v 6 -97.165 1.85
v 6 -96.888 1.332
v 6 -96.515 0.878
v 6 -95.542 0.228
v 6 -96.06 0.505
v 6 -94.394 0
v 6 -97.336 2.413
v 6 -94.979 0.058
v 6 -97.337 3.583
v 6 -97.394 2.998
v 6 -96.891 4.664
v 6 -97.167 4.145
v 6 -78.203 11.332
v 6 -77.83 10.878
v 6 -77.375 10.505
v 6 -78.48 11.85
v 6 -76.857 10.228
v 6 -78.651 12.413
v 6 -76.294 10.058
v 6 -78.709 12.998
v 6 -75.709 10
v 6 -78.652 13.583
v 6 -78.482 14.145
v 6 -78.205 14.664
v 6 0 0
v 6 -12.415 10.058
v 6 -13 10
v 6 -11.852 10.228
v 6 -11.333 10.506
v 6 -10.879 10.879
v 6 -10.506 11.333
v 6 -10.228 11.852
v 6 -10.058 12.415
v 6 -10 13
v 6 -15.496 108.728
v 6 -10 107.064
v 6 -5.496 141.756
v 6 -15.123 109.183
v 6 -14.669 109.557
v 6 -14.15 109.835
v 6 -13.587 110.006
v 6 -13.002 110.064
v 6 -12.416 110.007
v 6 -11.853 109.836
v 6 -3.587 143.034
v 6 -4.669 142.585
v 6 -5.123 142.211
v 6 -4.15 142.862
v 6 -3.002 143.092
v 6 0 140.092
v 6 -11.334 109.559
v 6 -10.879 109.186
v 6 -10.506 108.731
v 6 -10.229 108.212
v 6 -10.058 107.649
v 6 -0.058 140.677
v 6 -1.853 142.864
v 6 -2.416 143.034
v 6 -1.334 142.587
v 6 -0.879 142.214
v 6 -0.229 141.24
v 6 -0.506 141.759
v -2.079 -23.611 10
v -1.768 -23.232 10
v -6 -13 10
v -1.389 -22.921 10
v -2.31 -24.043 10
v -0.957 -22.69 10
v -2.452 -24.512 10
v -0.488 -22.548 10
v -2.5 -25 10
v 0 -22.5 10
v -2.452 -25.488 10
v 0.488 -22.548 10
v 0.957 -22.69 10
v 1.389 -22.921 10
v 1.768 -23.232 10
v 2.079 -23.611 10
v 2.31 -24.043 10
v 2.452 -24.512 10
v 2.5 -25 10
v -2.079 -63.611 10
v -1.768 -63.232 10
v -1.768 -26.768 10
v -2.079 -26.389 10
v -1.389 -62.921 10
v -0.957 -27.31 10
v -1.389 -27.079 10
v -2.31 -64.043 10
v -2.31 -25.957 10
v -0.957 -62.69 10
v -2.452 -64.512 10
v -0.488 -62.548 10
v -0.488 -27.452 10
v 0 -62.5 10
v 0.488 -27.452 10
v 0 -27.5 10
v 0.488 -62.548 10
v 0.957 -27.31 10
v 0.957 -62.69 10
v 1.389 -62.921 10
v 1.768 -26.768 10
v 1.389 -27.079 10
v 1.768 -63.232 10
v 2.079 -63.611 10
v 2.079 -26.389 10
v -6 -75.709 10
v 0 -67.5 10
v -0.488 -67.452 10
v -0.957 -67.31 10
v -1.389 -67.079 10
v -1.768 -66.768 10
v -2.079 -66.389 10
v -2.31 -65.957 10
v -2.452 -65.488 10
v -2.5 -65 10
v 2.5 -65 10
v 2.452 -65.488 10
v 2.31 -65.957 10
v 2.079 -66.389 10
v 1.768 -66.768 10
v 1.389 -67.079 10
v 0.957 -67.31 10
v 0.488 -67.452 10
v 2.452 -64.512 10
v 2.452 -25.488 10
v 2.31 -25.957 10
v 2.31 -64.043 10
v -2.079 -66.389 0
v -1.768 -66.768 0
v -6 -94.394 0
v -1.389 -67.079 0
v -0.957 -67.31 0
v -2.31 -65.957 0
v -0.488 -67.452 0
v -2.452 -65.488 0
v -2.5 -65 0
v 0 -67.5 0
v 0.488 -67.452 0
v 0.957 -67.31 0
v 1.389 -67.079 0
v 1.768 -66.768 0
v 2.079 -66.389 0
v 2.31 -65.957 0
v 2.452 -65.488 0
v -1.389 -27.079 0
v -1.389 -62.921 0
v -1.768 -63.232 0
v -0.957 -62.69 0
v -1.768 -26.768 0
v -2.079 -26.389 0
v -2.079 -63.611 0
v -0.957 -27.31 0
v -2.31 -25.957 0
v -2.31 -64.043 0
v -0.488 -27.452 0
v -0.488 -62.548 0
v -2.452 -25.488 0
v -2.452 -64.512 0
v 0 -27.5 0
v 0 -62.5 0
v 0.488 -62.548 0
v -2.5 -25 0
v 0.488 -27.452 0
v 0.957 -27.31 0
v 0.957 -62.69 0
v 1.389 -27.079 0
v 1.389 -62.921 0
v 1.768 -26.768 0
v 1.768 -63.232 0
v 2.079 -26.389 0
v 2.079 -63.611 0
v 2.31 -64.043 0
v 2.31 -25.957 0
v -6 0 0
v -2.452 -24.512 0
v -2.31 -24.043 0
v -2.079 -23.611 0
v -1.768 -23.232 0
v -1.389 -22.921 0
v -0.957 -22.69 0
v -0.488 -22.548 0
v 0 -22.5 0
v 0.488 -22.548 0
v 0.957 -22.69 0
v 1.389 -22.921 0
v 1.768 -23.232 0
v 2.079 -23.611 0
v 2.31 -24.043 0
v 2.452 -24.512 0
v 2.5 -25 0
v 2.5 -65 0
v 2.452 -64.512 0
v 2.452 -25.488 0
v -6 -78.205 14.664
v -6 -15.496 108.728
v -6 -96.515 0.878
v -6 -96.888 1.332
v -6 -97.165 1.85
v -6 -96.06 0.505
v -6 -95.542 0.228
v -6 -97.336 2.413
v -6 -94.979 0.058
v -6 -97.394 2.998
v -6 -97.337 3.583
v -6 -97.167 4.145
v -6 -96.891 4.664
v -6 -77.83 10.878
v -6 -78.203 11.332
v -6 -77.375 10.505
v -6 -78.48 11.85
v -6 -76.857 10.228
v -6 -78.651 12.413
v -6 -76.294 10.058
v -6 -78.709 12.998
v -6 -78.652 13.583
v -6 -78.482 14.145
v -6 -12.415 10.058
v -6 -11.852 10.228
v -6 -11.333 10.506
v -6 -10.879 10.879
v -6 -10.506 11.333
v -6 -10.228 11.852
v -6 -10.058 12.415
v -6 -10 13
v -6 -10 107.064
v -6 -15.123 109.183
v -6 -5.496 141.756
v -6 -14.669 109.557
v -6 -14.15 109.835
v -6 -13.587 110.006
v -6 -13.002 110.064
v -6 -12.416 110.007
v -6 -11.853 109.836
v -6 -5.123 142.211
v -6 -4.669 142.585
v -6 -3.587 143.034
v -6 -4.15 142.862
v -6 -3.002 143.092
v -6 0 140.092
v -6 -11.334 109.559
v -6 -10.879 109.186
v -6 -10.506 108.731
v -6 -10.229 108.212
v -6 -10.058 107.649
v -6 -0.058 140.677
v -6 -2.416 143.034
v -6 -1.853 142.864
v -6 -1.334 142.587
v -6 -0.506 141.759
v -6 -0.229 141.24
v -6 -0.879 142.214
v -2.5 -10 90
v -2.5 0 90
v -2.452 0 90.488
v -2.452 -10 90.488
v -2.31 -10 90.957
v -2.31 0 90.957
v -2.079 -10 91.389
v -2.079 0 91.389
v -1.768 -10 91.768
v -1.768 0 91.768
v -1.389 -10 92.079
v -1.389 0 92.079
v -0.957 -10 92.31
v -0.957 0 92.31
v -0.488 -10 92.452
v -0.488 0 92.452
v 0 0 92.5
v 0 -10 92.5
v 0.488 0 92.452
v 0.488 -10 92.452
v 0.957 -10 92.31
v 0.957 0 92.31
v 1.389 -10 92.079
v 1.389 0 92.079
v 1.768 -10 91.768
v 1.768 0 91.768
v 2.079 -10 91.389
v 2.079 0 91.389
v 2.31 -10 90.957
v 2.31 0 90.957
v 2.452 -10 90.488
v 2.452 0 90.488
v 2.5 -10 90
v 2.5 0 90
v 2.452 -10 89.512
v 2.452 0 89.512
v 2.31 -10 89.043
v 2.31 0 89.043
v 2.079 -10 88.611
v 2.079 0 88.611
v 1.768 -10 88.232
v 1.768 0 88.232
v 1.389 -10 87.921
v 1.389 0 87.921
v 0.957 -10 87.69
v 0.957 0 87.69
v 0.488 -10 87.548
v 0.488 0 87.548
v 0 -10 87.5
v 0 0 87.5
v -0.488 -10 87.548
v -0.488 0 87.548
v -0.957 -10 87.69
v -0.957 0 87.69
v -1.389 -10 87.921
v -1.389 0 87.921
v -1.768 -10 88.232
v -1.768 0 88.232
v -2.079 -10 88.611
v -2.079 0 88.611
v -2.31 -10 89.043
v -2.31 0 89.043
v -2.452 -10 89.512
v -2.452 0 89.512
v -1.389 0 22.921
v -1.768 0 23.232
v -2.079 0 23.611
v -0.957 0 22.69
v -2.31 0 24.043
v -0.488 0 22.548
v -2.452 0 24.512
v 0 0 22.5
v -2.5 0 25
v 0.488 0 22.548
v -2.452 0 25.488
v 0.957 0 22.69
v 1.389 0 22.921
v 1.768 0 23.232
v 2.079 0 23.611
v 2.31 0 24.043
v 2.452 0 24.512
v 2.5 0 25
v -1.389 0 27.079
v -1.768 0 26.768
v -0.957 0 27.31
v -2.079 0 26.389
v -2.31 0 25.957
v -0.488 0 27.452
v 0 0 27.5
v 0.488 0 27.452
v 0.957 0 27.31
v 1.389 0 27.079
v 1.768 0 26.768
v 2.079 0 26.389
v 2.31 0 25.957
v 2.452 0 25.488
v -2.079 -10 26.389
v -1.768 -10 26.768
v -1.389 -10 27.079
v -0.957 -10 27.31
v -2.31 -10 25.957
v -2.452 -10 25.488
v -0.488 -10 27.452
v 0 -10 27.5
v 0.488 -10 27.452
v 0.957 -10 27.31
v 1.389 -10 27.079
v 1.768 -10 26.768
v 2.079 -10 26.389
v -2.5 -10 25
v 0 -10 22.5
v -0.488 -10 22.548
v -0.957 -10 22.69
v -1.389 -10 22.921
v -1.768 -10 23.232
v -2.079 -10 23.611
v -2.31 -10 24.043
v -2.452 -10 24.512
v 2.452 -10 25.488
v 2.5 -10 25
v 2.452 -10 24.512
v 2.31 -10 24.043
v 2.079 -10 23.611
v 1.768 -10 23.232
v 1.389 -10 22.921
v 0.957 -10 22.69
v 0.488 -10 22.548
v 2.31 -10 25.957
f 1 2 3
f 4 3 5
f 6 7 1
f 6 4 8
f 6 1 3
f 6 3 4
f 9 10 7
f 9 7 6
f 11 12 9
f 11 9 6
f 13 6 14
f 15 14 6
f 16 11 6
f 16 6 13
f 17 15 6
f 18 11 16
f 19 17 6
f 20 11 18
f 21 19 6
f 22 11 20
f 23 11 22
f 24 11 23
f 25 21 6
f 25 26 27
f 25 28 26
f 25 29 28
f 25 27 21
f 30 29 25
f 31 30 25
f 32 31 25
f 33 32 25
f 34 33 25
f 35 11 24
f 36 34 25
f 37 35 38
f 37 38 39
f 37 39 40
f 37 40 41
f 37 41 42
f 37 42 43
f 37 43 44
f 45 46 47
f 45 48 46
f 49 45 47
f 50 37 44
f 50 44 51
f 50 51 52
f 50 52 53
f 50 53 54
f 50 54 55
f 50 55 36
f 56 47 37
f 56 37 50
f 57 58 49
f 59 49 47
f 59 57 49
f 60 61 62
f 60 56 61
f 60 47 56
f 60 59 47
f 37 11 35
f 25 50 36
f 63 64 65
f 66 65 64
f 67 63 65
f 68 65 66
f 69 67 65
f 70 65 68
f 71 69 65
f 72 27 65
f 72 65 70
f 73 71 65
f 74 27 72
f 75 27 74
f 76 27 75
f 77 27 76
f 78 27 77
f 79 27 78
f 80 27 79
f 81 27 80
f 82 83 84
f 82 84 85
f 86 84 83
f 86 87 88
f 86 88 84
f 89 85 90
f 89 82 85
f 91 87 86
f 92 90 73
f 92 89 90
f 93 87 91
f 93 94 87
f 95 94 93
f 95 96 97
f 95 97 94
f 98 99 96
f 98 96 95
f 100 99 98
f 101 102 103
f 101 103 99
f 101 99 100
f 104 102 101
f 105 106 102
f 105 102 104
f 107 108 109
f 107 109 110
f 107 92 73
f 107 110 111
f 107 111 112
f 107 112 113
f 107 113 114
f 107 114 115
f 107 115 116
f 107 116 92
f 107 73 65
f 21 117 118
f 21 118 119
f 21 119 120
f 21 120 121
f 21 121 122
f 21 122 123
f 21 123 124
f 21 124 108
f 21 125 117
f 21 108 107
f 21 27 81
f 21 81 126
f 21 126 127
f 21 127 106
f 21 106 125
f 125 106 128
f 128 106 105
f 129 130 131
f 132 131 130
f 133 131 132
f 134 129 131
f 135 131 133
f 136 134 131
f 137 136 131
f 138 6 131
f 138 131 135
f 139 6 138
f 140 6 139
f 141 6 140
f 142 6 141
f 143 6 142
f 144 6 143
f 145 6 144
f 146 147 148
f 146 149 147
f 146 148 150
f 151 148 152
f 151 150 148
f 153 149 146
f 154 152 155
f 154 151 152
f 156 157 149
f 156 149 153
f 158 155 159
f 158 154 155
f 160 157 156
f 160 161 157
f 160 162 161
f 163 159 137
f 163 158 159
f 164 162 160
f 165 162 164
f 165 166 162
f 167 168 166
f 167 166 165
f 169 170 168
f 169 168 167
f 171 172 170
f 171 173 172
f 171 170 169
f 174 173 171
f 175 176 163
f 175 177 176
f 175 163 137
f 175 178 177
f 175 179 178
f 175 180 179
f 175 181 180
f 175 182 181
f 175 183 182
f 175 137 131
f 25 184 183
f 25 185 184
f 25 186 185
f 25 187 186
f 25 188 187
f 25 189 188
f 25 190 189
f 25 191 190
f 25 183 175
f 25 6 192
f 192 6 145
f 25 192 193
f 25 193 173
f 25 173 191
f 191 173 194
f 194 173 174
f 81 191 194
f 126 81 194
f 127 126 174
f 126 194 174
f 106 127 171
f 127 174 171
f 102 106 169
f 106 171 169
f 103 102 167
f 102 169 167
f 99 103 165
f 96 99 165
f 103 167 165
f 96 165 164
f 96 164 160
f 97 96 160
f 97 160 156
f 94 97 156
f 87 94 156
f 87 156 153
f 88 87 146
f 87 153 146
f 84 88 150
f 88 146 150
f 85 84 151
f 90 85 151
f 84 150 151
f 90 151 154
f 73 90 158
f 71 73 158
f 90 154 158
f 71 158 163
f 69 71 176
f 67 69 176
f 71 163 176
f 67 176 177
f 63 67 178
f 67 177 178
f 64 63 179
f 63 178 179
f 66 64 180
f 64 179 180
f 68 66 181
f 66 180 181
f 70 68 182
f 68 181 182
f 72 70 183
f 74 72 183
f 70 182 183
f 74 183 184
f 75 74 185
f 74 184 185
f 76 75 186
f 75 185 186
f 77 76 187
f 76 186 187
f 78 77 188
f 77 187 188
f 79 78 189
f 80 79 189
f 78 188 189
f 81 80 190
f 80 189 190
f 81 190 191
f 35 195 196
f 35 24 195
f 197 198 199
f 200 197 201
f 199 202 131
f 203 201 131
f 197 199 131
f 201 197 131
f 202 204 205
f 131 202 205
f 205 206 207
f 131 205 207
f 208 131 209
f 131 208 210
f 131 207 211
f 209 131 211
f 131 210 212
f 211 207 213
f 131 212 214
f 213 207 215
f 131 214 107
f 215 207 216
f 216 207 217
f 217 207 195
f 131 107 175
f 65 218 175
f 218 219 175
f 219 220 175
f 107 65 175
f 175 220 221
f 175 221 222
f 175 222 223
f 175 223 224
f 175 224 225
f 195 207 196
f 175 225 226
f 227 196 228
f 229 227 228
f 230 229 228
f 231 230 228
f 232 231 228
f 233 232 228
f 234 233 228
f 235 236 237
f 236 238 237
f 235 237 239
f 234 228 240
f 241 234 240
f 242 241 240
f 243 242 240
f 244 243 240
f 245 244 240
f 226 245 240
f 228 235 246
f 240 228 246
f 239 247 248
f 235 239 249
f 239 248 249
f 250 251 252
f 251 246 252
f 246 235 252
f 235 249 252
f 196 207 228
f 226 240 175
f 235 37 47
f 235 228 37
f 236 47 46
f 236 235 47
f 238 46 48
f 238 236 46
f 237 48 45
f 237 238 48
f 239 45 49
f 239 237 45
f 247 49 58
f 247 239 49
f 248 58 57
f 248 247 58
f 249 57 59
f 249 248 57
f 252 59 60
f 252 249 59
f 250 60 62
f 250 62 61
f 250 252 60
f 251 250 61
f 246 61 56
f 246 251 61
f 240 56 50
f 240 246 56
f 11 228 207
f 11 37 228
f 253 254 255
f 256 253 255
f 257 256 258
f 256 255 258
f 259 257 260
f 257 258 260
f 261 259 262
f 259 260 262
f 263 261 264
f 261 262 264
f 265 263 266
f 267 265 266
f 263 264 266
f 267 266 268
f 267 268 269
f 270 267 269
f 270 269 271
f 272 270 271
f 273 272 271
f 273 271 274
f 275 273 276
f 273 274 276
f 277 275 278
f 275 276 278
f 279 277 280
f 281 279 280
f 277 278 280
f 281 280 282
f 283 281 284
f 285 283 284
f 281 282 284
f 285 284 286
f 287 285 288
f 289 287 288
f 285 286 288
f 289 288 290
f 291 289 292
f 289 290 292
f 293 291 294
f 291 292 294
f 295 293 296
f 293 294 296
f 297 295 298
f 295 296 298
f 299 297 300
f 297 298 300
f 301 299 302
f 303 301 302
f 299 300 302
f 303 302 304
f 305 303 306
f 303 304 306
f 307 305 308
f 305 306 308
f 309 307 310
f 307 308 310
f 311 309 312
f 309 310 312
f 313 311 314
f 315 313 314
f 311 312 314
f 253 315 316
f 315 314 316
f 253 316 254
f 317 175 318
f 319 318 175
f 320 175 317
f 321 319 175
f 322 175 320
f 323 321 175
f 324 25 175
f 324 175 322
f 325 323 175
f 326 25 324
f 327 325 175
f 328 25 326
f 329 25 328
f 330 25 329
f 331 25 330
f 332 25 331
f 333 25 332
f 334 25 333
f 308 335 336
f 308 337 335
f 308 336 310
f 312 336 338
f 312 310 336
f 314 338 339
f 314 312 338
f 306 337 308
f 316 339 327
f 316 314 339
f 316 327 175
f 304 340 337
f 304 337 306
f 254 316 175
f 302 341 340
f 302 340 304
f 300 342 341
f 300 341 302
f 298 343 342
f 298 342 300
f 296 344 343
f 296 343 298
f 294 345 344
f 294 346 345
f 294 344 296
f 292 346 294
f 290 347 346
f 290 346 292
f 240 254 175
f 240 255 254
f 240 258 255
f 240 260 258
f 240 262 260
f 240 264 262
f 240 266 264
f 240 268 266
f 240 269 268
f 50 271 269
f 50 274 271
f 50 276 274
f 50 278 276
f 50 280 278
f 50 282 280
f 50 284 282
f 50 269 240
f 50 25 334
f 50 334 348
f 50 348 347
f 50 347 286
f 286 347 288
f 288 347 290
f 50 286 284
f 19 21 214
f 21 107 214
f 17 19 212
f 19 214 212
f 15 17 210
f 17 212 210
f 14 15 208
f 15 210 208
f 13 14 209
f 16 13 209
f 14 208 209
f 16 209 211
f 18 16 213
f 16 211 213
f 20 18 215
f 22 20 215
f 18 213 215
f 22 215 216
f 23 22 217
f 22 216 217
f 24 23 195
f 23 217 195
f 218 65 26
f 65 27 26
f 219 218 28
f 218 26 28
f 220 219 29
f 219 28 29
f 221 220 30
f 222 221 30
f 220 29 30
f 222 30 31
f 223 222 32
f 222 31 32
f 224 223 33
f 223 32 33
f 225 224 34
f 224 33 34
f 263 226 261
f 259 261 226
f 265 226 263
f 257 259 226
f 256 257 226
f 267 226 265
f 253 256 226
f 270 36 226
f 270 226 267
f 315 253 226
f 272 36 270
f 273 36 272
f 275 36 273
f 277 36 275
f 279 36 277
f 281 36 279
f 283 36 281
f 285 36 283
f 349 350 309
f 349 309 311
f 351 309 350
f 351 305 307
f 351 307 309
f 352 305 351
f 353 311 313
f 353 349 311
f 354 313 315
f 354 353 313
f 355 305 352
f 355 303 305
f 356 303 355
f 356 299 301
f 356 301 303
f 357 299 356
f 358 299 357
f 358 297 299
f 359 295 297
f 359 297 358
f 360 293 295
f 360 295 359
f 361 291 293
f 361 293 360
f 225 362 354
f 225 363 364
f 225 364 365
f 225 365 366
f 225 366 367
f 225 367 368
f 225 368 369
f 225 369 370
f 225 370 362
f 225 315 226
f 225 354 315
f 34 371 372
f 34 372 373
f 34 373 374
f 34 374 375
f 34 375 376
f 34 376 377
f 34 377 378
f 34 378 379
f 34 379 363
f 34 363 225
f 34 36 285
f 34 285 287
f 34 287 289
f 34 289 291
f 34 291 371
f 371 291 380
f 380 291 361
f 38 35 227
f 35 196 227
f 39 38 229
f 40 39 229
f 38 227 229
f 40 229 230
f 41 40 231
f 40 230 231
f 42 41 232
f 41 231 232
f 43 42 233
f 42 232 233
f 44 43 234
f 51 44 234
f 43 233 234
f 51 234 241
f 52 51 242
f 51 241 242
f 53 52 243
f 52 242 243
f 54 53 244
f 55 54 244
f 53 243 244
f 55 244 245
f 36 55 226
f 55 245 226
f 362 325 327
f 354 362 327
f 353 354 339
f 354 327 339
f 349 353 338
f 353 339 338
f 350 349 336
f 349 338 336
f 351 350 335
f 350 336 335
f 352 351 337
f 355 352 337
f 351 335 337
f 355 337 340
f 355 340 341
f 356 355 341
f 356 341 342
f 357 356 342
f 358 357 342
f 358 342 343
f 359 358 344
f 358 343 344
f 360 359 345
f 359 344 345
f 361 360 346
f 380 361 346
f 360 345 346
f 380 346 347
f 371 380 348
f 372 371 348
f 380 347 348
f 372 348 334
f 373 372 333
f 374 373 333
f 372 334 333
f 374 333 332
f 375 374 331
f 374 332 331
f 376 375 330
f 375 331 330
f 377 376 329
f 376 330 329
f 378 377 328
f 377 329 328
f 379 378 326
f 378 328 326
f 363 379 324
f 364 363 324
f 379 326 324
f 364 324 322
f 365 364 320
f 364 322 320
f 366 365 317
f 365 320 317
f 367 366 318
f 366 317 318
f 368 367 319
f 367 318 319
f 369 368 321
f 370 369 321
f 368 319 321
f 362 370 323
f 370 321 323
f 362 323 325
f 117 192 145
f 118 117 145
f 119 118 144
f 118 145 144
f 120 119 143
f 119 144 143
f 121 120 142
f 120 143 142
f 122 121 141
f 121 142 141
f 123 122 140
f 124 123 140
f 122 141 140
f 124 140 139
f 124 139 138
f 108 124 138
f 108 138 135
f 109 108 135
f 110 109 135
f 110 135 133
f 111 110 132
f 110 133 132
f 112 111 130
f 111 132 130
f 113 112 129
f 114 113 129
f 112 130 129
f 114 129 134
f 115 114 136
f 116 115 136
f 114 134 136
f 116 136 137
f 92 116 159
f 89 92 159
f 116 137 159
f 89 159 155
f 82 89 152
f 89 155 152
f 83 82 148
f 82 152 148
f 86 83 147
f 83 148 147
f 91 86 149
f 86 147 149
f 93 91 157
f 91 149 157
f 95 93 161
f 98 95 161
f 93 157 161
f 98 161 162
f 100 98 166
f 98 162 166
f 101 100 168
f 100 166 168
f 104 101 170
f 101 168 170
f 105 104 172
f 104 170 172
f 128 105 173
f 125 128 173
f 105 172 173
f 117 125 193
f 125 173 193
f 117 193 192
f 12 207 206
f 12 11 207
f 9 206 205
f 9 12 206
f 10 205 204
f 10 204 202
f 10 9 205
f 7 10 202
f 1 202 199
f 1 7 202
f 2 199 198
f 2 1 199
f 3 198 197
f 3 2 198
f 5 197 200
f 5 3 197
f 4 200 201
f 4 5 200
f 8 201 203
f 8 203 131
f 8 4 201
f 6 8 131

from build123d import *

# Parameters (mm, degrees)
F1_DEPTH = 6
F2_R     = 3
F3_R     = 2.5
F4_DEPTH = 10
F5_R     = 2.5
F6_DEPTH = 10


with BuildPart() as f1:
    # F0 (on Right) → F1 (new body, symmetric)
    with BuildSketch(Plane.YZ):
        Polygon((0, 150), (-100, 0), (0, 0), align=None)
        Polygon((-10, 10), (-81.314829, 10), (-10, 116.972244), align=None, mode=Mode.SUBTRACT)
    extrude(amount=F1_DEPTH, both=True)

    # F2
    f2_edges = [f1.edges().sort_by_distance(p)[0] for p in [
        (0, -100, 0),
        (0, 0, 150),
        (0, -10, 116.972244),
        (0, -10, 10),
        (0, -81.314829, 10),
    ]]
    fillet(f2_edges, radius=F2_R)

    # F3 (on face) → F4 (cut, through all)
    with BuildSketch(Plane(origin=(0, 0, 0), x_dir=(-1, 0, 0), z_dir=(0, 1, 0))):
        with Locations((0, 90)):
            Circle(F3_R)
        with Locations((0, 25)):
            Circle(F3_R)
    extrude(amount=-F4_DEPTH, mode=Mode.SUBTRACT)

    # F5 (on face) → F6 (cut, through all)
    with BuildSketch(Plane(origin=(0, 0, 0), x_dir=(1, 0, 0), z_dir=(0, 0, -1))):
        with Locations((0, 25)):
            Circle(F5_R)
        with Locations((0, 65)):
            Circle(F5_R)
    extrude(amount=-F6_DEPTH, mode=Mode.SUBTRACT)


solid = f1.part
